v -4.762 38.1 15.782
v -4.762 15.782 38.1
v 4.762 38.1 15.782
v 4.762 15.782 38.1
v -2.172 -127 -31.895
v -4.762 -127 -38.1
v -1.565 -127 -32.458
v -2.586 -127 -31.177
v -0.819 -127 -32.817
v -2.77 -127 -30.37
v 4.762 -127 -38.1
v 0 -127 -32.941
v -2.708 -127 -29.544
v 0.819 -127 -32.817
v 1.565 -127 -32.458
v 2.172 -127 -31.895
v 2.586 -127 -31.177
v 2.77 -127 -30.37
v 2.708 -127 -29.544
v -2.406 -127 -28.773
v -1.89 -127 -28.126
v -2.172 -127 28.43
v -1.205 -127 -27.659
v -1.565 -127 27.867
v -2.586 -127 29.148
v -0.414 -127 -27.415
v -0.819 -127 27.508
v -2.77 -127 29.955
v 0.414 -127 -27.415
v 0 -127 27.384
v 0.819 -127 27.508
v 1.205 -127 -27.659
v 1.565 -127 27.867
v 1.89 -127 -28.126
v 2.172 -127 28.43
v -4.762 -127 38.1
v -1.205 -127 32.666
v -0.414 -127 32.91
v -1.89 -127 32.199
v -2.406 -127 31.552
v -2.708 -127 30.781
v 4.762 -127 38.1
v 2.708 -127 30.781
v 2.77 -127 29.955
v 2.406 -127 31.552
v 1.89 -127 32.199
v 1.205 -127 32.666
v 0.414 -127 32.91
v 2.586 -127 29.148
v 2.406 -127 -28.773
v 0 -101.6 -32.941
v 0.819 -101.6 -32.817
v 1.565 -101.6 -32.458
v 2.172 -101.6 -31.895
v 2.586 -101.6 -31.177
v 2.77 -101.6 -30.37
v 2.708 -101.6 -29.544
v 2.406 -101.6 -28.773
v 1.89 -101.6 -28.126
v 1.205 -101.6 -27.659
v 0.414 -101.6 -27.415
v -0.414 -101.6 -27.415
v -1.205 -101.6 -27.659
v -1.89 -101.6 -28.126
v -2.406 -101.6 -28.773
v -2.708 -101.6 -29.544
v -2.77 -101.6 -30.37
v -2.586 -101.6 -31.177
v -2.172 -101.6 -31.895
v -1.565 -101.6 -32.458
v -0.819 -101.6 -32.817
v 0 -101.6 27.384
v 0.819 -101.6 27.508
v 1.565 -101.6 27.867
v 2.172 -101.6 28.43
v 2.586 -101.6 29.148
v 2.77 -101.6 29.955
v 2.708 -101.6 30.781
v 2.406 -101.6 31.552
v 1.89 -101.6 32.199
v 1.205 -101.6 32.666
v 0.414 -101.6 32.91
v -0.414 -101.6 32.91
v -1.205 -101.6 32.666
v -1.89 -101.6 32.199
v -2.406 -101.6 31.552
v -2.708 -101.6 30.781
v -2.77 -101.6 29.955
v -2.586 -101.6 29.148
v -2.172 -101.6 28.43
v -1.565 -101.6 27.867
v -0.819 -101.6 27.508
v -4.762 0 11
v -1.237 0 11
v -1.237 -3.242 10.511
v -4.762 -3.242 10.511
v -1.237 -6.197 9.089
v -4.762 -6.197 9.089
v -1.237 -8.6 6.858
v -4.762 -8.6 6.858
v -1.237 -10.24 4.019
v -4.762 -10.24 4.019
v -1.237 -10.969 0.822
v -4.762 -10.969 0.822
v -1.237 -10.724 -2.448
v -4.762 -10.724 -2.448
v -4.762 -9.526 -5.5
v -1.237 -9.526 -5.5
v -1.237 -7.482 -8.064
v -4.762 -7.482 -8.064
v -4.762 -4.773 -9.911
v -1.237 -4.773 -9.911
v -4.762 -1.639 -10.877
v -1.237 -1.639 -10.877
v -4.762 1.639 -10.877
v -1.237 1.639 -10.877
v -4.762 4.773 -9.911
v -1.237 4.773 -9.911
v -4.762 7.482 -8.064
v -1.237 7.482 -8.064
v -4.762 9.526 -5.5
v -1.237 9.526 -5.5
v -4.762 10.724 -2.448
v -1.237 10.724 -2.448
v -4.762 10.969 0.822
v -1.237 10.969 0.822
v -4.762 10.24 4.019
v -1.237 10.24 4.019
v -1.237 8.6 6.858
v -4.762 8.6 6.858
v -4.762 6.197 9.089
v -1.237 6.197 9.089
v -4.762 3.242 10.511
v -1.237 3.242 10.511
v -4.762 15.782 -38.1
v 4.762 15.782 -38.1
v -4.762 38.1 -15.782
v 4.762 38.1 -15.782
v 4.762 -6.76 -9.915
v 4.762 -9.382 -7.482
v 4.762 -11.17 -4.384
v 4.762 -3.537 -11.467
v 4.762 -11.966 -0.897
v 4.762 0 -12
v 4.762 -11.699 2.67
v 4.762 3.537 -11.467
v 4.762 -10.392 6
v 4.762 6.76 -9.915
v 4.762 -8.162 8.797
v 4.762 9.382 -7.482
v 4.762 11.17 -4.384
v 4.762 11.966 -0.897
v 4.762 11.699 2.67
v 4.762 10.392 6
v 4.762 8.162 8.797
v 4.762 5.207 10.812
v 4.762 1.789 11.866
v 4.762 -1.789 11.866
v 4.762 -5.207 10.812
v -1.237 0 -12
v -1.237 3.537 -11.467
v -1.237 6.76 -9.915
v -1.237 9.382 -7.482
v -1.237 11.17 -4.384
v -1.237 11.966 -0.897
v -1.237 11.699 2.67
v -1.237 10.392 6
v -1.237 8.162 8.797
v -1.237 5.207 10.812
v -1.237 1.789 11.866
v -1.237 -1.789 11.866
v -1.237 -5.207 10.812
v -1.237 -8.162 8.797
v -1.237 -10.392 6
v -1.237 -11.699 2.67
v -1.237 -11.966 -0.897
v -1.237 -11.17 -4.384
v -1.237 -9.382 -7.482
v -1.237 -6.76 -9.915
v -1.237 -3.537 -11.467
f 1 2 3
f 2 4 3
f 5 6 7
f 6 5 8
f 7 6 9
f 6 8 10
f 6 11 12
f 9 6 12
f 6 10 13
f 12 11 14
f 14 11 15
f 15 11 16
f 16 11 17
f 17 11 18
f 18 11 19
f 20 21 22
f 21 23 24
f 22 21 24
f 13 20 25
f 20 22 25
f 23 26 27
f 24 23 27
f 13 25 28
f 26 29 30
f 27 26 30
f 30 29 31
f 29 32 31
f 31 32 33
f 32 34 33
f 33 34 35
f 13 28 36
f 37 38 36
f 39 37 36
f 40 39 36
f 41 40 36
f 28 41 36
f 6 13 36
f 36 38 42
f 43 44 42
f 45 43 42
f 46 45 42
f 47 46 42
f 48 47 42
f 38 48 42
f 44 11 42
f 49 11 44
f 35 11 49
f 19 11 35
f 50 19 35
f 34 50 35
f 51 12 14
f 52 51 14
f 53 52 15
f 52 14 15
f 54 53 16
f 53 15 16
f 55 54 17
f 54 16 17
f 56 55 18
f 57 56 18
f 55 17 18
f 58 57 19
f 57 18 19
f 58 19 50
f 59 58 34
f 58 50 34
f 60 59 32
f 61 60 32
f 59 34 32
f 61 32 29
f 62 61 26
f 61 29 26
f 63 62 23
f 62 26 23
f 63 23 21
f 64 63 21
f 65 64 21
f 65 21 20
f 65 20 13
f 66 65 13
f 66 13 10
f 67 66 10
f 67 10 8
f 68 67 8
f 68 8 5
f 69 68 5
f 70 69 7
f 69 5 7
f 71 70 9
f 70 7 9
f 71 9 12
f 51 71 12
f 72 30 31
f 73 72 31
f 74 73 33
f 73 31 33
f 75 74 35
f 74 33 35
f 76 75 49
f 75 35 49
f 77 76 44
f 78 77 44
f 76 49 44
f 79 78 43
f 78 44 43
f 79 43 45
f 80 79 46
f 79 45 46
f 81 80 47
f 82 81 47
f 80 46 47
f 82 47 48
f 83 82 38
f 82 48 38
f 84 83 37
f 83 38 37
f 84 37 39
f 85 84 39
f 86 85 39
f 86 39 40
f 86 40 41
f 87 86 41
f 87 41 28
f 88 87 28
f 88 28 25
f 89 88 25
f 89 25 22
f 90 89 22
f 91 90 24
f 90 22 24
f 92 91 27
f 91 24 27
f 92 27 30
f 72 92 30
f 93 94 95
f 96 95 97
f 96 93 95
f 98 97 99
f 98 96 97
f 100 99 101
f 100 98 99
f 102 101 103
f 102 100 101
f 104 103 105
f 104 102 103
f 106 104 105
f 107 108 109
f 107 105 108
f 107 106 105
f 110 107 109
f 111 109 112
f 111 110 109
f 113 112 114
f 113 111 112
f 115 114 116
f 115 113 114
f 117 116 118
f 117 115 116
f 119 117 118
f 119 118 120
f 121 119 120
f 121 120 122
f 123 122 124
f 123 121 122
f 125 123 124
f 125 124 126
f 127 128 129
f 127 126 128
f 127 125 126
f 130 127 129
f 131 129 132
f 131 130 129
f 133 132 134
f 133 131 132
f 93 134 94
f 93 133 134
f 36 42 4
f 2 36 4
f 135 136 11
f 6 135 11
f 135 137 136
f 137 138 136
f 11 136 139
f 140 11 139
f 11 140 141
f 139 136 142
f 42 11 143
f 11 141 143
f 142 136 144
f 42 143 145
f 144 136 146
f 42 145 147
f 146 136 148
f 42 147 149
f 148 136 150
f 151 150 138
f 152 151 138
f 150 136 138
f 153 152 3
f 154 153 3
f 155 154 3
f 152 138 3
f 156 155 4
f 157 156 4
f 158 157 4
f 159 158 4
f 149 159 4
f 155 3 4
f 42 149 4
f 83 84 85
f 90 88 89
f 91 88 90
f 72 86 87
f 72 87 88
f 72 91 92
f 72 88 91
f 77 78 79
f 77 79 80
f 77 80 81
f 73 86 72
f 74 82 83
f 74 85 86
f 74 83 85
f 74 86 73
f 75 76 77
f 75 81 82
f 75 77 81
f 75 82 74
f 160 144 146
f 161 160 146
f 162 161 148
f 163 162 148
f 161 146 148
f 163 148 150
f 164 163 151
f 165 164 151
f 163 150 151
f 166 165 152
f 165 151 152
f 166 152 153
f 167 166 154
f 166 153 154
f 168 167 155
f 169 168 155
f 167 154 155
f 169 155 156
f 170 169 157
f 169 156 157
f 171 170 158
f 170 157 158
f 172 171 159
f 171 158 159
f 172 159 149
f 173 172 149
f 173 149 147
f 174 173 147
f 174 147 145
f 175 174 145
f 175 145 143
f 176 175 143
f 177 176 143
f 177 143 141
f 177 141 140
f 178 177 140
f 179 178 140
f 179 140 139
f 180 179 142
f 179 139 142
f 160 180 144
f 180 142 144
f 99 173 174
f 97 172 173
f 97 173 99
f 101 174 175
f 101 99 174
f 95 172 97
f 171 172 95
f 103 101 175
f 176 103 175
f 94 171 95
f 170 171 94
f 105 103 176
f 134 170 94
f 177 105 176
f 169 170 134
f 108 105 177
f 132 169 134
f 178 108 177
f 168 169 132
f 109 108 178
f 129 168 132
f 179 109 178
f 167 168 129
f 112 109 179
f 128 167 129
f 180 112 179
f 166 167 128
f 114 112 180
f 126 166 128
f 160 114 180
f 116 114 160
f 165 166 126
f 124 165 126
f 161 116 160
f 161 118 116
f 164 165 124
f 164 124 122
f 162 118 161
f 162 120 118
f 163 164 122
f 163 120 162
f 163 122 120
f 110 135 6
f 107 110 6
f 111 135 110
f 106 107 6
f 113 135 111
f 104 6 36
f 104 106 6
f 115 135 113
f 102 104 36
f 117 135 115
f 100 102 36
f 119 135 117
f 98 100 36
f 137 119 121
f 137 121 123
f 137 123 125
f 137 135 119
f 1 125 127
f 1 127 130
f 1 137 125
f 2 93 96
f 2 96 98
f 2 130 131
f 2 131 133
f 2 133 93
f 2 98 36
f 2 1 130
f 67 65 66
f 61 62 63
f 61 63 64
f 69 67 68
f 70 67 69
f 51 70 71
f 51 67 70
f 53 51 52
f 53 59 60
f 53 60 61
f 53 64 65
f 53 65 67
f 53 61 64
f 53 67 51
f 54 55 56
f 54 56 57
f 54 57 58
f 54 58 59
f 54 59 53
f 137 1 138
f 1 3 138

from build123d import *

# Parameters (mm, degrees)
SKETCH1_R           = 11
BOSS_EXTRUDE1_DEPTH = 4.7625
SKETCH2_R           = 12
CUT_EXTRUDE1_DEPTH  = 6
SKETCH3_R           = 2.778125
CUT_EXTRUDE2_DEPTH  = 25.4


with BuildPart() as part:
    # Sketch1 → Boss-Extrude1 (new, symmetric)
    with BuildSketch(Plane(origin=(0, 0, 0), x_dir=(0, 0, -1), z_dir=(1, 0, 0))):
        Polygon((-38.1, -127), (-38.1, 15.781536726), (-15.781536726, 38.1), (15.781536726, 38.1), (38.1, 15.781536726), (38.1, -127), align=None)
        with Locations(Location((0, 0, 0), (0, 0, 180))):
            Circle(SKETCH1_R, mode=Mode.SUBTRACT)
    extrude(amount=BOSS_EXTRUDE1_DEPTH, both=True)

    # Sketch2 → Cut-Extrude1 (cut)
    with BuildSketch(Plane(origin=(4.7625, 0, 0), x_dir=(0, 0, -1), z_dir=(1, 0, 0))):
        Circle(SKETCH2_R)
    extrude(amount=-CUT_EXTRUDE1_DEPTH, mode=Mode.SUBTRACT)

    # Sketch3 → Cut-Extrude2 (cut)
    with BuildSketch(Plane.XZ.offset(127)):
        with Locations(Location((0, 30.1625, 0), (0, 0, 270))):
            Circle(SKETCH3_R)
        with Locations(Location((0, -30.1625, 0), (0, 0, 270))):
            Circle(SKETCH3_R)
    extrude(amount=-CUT_EXTRUDE2_DEPTH, mode=Mode.SUBTRACT)


solid = part.part
